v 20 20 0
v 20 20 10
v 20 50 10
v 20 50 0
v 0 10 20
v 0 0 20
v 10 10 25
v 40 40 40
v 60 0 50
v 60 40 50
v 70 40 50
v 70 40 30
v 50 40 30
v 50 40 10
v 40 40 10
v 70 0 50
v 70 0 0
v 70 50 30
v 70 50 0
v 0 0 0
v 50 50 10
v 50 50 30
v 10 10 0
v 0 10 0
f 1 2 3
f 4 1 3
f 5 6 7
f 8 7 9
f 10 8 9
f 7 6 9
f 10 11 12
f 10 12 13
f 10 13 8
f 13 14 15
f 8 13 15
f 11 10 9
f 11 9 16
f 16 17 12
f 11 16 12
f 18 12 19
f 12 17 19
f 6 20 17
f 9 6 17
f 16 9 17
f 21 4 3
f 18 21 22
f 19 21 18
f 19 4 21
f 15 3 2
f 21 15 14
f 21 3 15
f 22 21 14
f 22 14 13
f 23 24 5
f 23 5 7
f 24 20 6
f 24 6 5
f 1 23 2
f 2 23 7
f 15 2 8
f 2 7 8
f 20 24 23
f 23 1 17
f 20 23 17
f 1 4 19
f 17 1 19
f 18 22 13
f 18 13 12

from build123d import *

# Parameters (mm, degrees)
SKETCH1_W           = 70
SKETCH1_H           = 50
BOSS_EXTRUDE1_DEPTH = 50
CUT_EXTRUDE1_DEPTH  = 50
CUT_EXTRUDE2_DEPTH  = 50
CUT_EXTRUDE3_DEPTH  = 10
CUT_EXTRUDE4_DEPTH  = 57


with BuildPart() as part:
    # Sketch1 → Boss-Extrude1 (new body)
    with BuildSketch(Plane.XY):
        with Locations((35, 25)):
            Rectangle(SKETCH1_W, SKETCH1_H)
    extrude(amount=BOSS_EXTRUDE1_DEPTH)

    # Sketch2 → Cut-Extrude1 (cut)
    with BuildSketch(Plane.XY.offset(50)):
        Polygon((0, 10), (10, 10), (20, 20), (20, 50), (0, 50), align=None)
    extrude(amount=-CUT_EXTRUDE1_DEPTH, mode=Mode.SUBTRACT)

    # Sketch3 → Cut-Extrude2 (cut)
    with BuildSketch(Plane.XZ):
        Polygon((0, 20), (60, 50), (0, 50), align=None)
    extrude(amount=-CUT_EXTRUDE2_DEPTH, mode=Mode.SUBTRACT)

    # Sketch4 → Cut-Extrude3 (cut)
    with BuildSketch(Plane(origin=(0, 50, 0), x_dir=(1, 0, 0), z_dir=(0, 1, 0))):
        Polygon((20, -10), (50, -10), (50, -30), (70, -30), (70, -50), (60, -50), (20, -30), align=None)
    extrude(amount=-CUT_EXTRUDE3_DEPTH, mode=Mode.SUBTRACT)

    # Sketch5 → Cut-Extrude4 (cut)
    with BuildSketch(Plane.XY.offset(10)):
        Polygon((20, 20), (40, 40), (20, 40), align=None)
    extrude(amount=CUT_EXTRUDE4_DEPTH, mode=Mode.SUBTRACT)


solid = part.part
